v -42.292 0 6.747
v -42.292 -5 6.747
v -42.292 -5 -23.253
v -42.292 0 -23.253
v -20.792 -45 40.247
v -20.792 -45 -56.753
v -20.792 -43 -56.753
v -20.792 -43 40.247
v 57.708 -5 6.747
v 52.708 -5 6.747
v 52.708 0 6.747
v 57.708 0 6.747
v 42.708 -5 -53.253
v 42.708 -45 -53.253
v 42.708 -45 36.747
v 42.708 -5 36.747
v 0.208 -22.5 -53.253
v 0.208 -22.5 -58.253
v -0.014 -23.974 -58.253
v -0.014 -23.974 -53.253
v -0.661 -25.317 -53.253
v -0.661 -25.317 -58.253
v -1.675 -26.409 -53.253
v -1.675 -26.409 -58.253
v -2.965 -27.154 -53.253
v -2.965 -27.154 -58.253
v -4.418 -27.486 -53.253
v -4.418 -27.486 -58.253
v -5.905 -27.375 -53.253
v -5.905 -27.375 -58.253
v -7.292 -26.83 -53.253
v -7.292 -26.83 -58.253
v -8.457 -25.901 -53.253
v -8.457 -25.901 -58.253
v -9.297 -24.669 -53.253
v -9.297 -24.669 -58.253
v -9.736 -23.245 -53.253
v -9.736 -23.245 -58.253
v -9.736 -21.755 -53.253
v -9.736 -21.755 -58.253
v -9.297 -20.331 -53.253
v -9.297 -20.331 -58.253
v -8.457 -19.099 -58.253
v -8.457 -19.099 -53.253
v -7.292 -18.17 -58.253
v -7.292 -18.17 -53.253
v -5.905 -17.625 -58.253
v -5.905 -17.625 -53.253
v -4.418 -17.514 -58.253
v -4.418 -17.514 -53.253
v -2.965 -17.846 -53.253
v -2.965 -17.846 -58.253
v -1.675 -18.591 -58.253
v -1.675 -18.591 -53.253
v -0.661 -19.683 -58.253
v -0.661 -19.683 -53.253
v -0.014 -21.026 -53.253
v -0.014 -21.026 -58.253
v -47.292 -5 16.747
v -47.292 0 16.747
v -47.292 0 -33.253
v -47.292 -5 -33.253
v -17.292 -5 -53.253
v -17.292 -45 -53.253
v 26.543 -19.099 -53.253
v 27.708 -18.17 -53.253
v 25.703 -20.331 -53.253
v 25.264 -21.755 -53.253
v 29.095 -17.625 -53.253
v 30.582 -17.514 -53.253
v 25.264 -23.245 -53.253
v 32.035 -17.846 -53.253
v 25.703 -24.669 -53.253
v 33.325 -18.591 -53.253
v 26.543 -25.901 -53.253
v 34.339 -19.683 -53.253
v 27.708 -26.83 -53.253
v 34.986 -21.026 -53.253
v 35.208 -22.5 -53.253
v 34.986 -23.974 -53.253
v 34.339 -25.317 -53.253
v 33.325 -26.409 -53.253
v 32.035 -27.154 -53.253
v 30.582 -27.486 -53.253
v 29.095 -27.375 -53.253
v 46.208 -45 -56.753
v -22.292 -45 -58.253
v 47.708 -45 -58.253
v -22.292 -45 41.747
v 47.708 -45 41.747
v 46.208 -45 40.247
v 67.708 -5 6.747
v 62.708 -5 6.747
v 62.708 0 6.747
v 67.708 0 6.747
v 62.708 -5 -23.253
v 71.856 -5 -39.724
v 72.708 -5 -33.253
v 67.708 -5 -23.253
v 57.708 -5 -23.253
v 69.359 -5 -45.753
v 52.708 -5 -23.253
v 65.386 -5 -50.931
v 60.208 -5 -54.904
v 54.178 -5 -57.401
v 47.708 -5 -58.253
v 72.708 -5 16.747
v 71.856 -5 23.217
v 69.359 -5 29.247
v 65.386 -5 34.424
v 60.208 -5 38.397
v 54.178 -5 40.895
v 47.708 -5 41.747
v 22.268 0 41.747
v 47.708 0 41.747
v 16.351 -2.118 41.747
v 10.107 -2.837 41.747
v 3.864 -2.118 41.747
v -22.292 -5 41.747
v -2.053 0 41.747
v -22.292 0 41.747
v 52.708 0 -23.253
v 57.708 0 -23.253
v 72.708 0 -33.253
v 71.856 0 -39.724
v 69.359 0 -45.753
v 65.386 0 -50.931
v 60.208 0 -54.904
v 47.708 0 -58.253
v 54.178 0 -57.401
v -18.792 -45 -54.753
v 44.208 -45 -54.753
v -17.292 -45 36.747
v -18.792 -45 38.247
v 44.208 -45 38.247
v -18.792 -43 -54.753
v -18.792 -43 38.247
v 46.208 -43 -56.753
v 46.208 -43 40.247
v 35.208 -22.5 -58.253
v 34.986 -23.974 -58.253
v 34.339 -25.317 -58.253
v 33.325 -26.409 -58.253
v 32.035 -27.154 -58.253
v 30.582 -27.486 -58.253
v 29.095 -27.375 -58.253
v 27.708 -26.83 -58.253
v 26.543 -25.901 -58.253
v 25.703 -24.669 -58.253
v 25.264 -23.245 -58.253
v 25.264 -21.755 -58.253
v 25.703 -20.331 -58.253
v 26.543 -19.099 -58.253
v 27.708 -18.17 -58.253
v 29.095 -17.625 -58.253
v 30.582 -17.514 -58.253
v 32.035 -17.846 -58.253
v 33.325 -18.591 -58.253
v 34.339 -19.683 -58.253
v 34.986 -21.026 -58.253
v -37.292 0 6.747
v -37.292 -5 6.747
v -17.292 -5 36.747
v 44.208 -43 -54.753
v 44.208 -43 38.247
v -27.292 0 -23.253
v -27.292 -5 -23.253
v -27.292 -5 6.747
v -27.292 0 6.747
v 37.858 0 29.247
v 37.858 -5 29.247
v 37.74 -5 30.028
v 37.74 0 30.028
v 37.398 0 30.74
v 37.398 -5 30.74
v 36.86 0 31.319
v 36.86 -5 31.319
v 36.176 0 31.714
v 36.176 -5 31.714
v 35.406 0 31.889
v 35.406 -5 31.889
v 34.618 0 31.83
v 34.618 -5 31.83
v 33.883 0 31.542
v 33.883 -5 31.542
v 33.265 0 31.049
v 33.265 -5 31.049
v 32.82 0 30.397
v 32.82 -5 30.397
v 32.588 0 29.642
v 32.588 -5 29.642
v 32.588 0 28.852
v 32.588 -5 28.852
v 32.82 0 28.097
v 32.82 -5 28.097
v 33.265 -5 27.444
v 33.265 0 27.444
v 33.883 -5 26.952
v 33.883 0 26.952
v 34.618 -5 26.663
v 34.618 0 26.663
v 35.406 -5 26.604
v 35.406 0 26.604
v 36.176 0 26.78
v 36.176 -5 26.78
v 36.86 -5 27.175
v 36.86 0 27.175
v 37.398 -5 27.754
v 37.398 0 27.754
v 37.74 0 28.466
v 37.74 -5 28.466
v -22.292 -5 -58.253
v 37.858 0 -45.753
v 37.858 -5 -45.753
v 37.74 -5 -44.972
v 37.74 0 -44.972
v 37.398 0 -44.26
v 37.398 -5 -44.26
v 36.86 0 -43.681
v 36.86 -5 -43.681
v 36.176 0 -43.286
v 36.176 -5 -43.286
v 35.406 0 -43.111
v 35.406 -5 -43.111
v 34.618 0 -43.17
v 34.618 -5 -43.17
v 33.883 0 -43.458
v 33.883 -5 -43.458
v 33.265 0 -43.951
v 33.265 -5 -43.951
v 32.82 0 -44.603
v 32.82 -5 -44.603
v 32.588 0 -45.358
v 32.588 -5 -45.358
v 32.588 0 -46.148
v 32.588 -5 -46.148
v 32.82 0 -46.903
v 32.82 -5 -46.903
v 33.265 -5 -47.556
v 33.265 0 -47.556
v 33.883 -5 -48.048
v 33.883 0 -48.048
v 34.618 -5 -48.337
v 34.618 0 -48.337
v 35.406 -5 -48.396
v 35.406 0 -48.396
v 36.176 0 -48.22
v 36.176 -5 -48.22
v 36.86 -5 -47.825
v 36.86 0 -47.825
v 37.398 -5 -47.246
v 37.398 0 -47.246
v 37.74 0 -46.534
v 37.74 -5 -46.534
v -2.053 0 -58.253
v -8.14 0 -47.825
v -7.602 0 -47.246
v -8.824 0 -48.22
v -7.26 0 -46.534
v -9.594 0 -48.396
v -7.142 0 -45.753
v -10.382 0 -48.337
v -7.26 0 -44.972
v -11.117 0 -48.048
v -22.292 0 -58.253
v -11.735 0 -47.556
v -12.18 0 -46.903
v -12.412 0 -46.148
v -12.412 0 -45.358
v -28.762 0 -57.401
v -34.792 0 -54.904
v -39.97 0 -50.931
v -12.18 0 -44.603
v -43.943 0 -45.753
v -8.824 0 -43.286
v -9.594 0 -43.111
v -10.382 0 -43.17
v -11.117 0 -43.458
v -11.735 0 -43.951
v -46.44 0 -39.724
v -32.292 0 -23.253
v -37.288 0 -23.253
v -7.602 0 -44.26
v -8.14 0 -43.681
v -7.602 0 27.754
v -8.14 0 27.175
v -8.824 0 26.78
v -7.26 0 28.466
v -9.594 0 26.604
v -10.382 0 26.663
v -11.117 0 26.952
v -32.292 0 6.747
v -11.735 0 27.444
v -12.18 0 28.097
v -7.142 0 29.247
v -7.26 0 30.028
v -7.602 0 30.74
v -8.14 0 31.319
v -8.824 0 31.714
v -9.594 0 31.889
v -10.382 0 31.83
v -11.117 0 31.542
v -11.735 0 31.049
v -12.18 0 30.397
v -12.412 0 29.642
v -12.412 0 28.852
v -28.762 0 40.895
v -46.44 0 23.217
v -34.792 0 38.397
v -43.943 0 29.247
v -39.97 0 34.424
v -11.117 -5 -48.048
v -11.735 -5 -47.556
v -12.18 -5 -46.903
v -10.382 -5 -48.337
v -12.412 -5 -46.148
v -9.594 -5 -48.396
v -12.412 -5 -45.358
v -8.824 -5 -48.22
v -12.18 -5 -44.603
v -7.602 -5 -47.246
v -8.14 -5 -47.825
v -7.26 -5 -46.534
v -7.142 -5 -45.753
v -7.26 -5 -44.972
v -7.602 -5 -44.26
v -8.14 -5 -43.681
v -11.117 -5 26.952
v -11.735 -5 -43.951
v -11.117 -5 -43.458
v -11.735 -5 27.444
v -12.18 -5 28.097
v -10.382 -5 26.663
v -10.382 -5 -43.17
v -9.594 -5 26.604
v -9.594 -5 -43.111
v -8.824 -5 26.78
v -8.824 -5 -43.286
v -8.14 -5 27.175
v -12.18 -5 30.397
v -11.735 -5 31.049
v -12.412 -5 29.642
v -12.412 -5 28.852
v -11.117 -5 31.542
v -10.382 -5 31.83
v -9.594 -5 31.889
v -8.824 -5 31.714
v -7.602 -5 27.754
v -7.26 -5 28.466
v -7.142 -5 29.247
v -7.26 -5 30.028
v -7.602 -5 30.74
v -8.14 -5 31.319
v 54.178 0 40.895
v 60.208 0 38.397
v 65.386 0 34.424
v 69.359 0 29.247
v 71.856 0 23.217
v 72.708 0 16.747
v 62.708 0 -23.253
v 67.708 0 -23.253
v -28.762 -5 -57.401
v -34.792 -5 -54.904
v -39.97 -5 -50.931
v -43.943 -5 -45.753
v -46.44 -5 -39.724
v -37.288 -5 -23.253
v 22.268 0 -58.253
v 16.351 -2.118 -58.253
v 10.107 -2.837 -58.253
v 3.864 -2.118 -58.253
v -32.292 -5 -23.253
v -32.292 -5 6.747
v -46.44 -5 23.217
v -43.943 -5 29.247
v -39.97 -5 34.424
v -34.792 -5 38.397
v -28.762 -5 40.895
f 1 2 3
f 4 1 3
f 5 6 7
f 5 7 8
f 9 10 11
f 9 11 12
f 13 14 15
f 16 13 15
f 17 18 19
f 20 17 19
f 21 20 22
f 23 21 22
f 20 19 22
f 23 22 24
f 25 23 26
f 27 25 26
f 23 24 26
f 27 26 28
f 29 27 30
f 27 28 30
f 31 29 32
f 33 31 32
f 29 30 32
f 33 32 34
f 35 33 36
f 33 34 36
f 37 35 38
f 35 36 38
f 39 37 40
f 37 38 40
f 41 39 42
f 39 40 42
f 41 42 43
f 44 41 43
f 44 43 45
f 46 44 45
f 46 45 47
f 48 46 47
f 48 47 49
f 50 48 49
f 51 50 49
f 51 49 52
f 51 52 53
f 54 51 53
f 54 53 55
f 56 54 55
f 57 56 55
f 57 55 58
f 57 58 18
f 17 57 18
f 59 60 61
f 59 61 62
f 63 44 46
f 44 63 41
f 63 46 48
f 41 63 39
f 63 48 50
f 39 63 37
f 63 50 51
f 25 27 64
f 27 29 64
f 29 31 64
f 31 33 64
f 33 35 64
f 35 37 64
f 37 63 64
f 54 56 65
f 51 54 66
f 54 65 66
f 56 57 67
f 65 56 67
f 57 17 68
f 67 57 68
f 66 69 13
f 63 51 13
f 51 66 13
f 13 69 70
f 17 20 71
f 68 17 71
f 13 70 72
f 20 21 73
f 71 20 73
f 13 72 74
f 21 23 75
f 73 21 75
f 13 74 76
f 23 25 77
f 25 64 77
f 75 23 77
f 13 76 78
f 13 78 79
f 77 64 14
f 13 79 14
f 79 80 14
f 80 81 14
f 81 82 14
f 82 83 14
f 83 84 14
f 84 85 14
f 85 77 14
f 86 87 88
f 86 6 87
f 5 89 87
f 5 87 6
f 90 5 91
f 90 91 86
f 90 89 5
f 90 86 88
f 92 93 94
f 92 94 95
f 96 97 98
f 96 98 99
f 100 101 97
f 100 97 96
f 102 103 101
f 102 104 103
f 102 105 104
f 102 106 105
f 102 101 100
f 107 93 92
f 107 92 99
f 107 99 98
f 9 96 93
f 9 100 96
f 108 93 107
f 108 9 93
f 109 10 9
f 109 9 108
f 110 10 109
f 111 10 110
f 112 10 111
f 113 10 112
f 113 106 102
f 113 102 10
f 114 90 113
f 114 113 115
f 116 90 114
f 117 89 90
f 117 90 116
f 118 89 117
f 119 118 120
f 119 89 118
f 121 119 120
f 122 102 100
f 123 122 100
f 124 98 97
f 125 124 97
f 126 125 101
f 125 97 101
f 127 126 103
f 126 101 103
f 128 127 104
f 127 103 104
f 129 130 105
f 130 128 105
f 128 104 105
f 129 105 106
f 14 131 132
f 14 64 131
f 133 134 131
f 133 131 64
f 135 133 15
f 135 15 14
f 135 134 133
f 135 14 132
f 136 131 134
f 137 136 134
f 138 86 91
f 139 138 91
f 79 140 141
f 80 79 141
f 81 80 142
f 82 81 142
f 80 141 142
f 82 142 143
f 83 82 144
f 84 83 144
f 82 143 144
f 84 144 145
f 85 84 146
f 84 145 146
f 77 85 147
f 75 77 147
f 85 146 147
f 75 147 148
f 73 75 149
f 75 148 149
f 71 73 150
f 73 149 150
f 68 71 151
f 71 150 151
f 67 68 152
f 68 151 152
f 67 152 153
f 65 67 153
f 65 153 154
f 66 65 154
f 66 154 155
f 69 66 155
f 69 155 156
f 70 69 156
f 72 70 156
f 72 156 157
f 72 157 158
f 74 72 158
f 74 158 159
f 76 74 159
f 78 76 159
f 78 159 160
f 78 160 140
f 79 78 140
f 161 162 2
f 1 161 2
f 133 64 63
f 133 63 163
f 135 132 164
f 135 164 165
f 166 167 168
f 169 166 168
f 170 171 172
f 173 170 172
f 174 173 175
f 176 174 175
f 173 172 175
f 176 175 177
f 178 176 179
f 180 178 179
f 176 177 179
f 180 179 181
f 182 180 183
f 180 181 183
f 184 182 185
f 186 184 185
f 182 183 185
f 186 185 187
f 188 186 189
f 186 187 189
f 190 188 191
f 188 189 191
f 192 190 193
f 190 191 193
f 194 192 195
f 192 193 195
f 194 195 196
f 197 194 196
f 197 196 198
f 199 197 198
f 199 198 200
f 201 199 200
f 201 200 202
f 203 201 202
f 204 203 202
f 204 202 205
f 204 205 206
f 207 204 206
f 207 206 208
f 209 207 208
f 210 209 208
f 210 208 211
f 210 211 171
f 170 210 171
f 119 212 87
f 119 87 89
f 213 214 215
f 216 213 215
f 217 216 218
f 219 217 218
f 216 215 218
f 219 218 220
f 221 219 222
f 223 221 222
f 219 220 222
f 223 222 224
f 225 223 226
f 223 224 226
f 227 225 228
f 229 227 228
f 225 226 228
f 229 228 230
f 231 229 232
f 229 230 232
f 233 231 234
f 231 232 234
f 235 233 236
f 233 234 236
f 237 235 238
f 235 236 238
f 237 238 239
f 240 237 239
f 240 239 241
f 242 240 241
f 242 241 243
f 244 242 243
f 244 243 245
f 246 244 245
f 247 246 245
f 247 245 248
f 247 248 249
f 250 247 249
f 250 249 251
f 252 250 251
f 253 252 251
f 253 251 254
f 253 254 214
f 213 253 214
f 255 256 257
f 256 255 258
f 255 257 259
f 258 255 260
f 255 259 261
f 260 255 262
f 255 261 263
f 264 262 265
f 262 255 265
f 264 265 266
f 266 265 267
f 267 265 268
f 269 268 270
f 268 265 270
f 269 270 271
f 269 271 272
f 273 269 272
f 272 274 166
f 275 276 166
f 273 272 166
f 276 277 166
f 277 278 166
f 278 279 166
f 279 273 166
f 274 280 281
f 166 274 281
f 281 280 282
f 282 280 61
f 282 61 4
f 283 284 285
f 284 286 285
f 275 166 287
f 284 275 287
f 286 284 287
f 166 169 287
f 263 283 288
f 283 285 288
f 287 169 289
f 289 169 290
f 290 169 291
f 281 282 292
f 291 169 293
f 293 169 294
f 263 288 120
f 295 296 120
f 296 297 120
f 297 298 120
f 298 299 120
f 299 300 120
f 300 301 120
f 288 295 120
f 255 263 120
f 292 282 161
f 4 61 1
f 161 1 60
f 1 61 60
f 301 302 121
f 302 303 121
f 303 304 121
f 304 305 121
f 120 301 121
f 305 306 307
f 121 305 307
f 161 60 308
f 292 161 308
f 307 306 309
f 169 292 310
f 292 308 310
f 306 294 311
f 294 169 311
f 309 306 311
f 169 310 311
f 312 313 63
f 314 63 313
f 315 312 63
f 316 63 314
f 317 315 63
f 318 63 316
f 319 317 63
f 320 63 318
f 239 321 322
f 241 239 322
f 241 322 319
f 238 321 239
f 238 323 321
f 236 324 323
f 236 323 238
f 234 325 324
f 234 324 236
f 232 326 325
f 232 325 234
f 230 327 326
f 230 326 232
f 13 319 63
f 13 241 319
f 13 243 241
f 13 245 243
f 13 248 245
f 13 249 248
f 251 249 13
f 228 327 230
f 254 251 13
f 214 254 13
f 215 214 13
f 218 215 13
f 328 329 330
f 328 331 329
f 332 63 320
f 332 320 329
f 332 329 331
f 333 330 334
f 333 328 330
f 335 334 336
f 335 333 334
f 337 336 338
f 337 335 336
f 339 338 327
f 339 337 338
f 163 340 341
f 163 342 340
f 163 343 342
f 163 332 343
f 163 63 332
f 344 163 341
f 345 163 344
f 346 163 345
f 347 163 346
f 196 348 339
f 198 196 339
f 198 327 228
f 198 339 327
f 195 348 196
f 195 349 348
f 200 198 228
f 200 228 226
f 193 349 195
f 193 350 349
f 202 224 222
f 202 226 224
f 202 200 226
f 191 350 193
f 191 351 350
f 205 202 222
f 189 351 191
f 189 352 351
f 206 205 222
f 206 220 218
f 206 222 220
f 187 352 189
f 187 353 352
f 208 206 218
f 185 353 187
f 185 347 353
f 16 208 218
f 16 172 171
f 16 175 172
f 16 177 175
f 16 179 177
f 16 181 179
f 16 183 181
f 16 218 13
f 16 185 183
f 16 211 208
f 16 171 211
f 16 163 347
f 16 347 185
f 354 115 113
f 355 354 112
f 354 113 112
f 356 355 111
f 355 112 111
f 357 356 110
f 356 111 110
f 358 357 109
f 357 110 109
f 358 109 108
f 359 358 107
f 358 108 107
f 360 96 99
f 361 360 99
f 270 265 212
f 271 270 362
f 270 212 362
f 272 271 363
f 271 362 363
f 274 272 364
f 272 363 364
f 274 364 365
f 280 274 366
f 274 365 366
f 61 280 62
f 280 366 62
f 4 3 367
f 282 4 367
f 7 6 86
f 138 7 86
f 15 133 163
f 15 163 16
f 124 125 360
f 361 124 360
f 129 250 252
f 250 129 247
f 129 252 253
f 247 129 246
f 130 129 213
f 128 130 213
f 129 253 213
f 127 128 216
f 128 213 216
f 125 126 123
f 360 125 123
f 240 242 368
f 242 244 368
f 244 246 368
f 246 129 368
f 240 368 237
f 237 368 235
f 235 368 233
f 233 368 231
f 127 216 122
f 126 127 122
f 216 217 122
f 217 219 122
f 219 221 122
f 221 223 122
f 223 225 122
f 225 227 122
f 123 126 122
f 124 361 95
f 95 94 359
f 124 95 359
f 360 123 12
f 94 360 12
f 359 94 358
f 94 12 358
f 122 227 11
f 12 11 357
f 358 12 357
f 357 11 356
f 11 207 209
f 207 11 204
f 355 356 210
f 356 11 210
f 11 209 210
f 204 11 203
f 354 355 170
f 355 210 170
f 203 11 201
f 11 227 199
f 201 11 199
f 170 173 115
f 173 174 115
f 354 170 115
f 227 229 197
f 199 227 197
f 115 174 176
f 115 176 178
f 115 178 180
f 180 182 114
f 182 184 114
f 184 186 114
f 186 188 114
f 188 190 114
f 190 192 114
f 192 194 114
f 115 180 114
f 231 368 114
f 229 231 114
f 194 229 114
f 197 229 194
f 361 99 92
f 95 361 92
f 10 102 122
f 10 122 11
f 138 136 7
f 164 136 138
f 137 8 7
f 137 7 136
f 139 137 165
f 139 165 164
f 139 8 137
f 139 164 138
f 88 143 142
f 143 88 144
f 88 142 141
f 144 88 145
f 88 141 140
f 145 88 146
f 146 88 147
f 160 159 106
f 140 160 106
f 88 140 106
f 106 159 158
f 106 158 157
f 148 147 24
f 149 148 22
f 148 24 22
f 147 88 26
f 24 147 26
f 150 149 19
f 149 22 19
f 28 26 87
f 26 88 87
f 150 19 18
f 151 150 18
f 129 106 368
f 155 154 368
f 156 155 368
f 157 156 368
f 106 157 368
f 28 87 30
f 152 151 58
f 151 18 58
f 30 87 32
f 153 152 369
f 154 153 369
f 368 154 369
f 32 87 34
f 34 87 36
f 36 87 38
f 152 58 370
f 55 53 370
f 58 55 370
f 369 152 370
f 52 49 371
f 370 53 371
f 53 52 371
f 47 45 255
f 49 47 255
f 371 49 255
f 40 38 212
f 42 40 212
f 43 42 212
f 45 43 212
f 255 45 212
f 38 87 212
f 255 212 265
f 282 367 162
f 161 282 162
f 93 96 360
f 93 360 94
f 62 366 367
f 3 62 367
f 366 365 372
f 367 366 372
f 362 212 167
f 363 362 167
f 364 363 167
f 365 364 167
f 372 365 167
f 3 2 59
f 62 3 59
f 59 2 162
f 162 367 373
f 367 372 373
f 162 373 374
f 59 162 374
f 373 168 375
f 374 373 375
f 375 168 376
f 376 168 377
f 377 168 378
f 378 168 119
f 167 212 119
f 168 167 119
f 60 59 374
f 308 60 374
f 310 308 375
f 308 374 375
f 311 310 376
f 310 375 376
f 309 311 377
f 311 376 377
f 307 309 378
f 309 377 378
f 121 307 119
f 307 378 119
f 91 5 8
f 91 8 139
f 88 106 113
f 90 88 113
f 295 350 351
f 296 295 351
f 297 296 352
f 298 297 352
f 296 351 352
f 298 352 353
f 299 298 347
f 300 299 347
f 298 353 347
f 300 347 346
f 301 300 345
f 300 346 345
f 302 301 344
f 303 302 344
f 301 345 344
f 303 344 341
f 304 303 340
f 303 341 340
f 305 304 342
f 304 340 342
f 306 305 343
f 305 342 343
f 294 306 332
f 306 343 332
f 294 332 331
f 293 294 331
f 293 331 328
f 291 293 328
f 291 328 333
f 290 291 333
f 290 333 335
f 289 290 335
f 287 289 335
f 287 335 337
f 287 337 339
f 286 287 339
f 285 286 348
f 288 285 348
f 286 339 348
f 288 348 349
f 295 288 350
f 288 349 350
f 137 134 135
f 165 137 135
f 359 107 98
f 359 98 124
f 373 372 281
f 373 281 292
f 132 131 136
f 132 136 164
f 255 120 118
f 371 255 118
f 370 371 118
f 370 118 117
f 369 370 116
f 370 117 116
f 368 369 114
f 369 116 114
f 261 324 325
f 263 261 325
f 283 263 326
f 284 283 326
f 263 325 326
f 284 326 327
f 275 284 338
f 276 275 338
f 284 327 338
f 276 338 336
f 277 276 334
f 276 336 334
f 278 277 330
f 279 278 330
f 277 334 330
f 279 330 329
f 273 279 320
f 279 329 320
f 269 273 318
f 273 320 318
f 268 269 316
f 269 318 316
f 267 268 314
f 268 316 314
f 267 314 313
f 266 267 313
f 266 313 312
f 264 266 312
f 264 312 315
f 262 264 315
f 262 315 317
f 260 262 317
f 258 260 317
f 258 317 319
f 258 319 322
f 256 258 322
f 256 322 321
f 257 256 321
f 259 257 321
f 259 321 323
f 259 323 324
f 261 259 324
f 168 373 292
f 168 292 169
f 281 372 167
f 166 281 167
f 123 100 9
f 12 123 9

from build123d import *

# Parameters (mm, degrees)
F0_W      = 70
F0_H      = 100
F1_DEPTH  = 45
F2_W      = 60
F2_H      = 90
F3_DEPTH  = 40
F4_R      = 2.65
F5_DEPTH  = 5
F6_DEPTH  = 25
F7_DEPTH  = 25
F8_DEPTH  = 25
F9_W      = 5
F9_H      = 100
F10_DEPTH = 25
F11_W     = 5
F11_H     = 100
F12_DEPTH = 25
F14_DEPTH = 25
F15_DEPTH = 25
F17_DEPTH = 25
F18_W     = 67
F18_H     = 97
F18_W_2   = 63
F18_H_2   = 93
F19_DEPTH = 2
F13_W     = 5
F13_H     = 30
F20_DEPTH = 25
F16_W     = 5
F16_H     = 30
F21_DEPTH = 25
F22_R     = 5
F23_DEPTH = 25
F25_DEPTH = 100


with BuildPart() as f1:
    # F0 (on Front) → F1 (new body)
    with BuildSketch(Plane.XZ):
        with Locations((12.707982, -8.253274)):
            Rectangle(F0_W, F0_H)
    extrude(amount=F1_DEPTH)

    # F2 (on face) → F3 (cut)
    with BuildSketch(Plane.XZ.offset(45)):
        with Locations((12.707982, -8.253274)):
            Rectangle(F2_W, F2_H)
    extrude(amount=-F3_DEPTH, mode=Mode.SUBTRACT)

    # F4 (on face) → F5 (cut)
    with BuildSketch(Plane.XZ.offset(5)):
        with Locations((-9.792018, 29.246726)):
            Circle(F4_R)
    extrude(amount=-F5_DEPTH, mode=Mode.SUBTRACT)

    # F4 (on face) → F6 (cut)
    with BuildSketch(Plane.XZ.offset(5)):
        with Locations((35.207982, 29.246726)):
            Circle(F4_R)
    extrude(amount=-F6_DEPTH, mode=Mode.SUBTRACT)

    # F4 (on face) → F7 (cut)
    with BuildSketch(Plane.XZ.offset(5)):
        with Locations((35.207982, -45.753274)):
            Circle(F4_R)
    extrude(amount=-F7_DEPTH, mode=Mode.SUBTRACT)

    # F4 (on face) → F8 (cut)
    with BuildSketch(Plane.XZ.offset(5)):
        with Locations((-9.792018, -45.753274)):
            Circle(F4_R)
    extrude(amount=-F8_DEPTH, mode=Mode.SUBTRACT)

    # F9 (on face) → F10 (join)
    with BuildSketch(Plane(origin=(-22.292018, 0, 0), x_dir=(0, -1, 0), z_dir=(-1, 0, 0))):
        with Locations((2.5, -8.253274)):
            Rectangle(F9_W, F9_H)
    extrude(amount=F10_DEPTH)

    # F11 (on face) → F12 (join)
    with BuildSketch(Plane.YZ.offset(47.707982)):
        with Locations((-2.5, -8.253274)):
            Rectangle(F11_W, F11_H)
    extrude(amount=F12_DEPTH)

    # F13 (on face) → F14 (cut)
    with BuildSketch(Plane.XZ.offset(5)):
        with BuildLine():
            ThreePointArc((-47.292018, 16.746726), (-39.969687, 34.424395), (-22.292018, 41.746726))
            Line((-22.292018, 41.746726), (-47.292018, 41.746726))
            Line((-47.292018, 41.746726), (-47.292018, 16.746726))
        make_face()
    extrude(amount=-F14_DEPTH, mode=Mode.SUBTRACT)

    # F13 (on face) → F15 (cut)
    with BuildSketch(Plane.XZ.offset(5)):
        with BuildLine():
            Line((-47.292018, -58.253274), (-22.292018, -58.253274))
            ThreePointArc((-22.292018, -58.253274), (-39.969687, -50.930944), (-47.292018, -33.253274))
            Line((-47.292018, -33.253274), (-47.292018, -58.253274))
        make_face()
    extrude(amount=-F15_DEPTH, mode=Mode.SUBTRACT)

    # F16 (on face) → F17 (cut)
    with BuildSketch(Plane.XZ.offset(5)):
        with BuildLine():
            Line((72.707982, 41.746726), (47.707982, 41.746726))
            ThreePointArc((47.707982, 41.746726), (65.385652, 34.424395), (72.707982, 16.746726))
            Line((72.707982, 16.746726), (72.707982, 41.746726))
        make_face()
        with BuildLine():
            ThreePointArc((72.707982, -33.253274), (65.385652, -50.930944), (47.707982, -58.253274))
            Line((47.707982, -58.253274), (72.707982, -58.253274))
            Line((72.707982, -58.253274), (72.707982, -33.253274))
        make_face()
    extrude(amount=-F17_DEPTH, mode=Mode.SUBTRACT)

    # F18 (on face) → F19 (cut)
    with BuildSketch(Plane.XZ.offset(45)):
        with Locations((12.707982, -8.253274)):
            Rectangle(F18_W, F18_H)
        with Locations((12.707982, -8.253274)):
            Rectangle(F18_W_2, F18_H_2, mode=Mode.SUBTRACT)
    extrude(amount=-F19_DEPTH, mode=Mode.SUBTRACT)

    # F13 (on face) → F20 (cut)
    with BuildSketch(Plane.XZ.offset(5)):
        Polygon((-37.292018, 6.746726), (-42.292018, 6.746726), (-42.292018, -23.253274), (-37.288308, -23.253274), align=None)
        with Locations((-29.792018, -8.253274)):
            Rectangle(F13_W, F13_H)
    extrude(amount=-F20_DEPTH, mode=Mode.SUBTRACT)

    # F16 (on face) → F21 (cut)
    with BuildSketch(Plane.XZ.offset(5)):
        with Locations((55.207982, -8.253274)):
            Rectangle(F16_W, F16_H)
        with Locations((65.207982, -8.253274)):
            Rectangle(F16_W, F16_H)
    extrude(amount=-F21_DEPTH, mode=Mode.SUBTRACT)

    # F22 (on face) → F23 (cut)
    with BuildSketch(Plane(origin=(0, 0, -58.253274), x_dir=(1, 0, 0), z_dir=(0, 0, -1))):
        with Locations((30.207982, 22.5)):
            Circle(F22_R)
        with Locations((-4.792018, 22.5)):
            Circle(F22_R)
    extrude(amount=-F23_DEPTH, mode=Mode.SUBTRACT)

    # F24 (on face) → F25 (cut)
    with BuildSketch(Plane.XY.offset(41.746726)):
        with BuildLine():
            Line((22.267865, 0), (-2.053064, 0))
            ThreePointArc((-2.053064, 0), (10.1074, -2.837065), (22.267865, 0))
        make_face()
    extrude(amount=-F25_DEPTH, mode=Mode.SUBTRACT)


solid = f1.part
